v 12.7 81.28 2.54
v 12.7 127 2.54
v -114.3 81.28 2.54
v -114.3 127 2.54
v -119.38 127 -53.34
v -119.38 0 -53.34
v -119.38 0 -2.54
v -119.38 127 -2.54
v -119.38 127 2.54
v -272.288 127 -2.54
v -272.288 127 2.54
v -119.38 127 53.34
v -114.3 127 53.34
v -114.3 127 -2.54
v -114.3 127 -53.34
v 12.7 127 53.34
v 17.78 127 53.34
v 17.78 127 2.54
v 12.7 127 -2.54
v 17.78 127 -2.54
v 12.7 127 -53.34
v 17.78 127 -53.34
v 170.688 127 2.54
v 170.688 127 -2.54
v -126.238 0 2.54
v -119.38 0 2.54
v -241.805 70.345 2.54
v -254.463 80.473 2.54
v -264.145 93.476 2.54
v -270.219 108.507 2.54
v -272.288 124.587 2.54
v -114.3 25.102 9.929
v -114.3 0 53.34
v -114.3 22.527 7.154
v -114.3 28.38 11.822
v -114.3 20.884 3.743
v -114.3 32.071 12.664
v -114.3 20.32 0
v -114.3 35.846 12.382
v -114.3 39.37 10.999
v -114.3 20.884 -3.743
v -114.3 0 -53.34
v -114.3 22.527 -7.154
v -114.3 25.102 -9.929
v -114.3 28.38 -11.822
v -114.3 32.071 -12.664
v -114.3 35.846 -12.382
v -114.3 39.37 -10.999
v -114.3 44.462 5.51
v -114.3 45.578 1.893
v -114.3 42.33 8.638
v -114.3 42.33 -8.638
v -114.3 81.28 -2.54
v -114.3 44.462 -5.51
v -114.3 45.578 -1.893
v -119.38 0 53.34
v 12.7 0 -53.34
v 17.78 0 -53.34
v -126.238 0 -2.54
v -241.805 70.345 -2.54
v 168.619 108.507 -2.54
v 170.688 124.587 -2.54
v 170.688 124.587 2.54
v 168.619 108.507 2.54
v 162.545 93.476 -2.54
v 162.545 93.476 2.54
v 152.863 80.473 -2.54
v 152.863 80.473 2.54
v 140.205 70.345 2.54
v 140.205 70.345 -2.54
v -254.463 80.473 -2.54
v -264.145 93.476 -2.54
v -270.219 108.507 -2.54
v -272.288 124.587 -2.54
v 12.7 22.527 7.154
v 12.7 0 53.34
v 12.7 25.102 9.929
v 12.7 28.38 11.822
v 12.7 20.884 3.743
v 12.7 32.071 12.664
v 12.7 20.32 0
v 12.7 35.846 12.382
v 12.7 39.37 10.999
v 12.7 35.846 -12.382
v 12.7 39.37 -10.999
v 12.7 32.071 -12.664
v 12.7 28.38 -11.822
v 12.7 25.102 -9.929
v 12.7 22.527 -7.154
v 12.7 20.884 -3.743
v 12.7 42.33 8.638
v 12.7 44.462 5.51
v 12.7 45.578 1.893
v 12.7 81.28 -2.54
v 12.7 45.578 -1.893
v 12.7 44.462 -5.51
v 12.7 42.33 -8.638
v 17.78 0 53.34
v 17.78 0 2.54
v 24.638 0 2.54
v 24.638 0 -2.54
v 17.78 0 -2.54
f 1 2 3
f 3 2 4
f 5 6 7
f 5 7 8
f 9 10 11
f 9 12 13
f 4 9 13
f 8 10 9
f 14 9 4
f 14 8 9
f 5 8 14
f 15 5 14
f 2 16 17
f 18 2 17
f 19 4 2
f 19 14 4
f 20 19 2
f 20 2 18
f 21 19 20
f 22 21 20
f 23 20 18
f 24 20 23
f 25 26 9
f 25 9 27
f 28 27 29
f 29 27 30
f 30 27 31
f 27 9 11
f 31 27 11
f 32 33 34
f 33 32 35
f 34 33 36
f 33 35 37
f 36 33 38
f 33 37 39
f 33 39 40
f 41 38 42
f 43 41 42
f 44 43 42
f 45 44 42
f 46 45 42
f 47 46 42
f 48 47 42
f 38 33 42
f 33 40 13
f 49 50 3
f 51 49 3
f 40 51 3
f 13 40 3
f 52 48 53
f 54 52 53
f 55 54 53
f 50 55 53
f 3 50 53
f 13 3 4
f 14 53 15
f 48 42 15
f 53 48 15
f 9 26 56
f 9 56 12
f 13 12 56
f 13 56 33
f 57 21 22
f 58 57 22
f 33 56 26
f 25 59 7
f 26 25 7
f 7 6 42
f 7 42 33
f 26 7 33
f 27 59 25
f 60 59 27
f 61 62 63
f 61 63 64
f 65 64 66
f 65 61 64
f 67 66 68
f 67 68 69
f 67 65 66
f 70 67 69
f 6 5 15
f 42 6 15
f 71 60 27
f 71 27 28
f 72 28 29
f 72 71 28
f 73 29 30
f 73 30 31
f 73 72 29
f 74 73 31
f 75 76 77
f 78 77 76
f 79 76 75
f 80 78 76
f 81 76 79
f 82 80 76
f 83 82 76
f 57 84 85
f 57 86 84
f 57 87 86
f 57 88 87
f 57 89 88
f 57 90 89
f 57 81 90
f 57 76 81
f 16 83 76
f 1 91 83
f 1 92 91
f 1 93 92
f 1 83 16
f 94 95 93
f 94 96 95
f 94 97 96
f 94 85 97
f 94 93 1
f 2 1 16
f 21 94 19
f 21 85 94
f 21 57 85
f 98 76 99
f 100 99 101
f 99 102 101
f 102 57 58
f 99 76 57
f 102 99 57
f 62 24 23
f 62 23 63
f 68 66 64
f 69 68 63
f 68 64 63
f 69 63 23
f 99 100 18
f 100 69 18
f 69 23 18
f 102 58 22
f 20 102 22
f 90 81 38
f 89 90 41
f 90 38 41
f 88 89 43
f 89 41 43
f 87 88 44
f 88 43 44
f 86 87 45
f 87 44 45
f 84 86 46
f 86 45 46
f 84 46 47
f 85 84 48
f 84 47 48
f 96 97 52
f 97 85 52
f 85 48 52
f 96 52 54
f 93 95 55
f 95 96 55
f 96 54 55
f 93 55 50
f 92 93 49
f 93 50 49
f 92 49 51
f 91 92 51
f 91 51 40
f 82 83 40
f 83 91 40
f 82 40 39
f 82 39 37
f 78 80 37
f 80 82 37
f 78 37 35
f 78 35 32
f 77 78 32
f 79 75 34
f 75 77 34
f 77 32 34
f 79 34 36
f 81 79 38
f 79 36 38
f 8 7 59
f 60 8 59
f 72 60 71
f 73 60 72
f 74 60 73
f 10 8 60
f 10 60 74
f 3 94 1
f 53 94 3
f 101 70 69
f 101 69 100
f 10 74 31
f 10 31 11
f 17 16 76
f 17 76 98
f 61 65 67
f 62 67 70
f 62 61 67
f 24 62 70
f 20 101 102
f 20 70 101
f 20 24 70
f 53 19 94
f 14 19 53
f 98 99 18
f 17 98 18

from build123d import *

# Parameters (mm, degrees)
BOSS_EXTRUDE1_DEPTH      = 2.54
BOSS_EXTRUDE1_DEPTH_BACK = 2.54
BOSS_EXTRUDE2_DEPTH      = 50.8
BOSS_EXTRUDE2_DEPTH_BACK = 55.88
SKETCH3_W                = 5.08
SKETCH3_H                = 127
BOSS_EXTRUDE3_REACH      = 318.532
SKETCH4_R                = 12.7


with BuildPart() as part:
    # Sketch2 → Boss-Extrude1 (new, two sides: drawn at the far end of the back side and taken through both)
    with BuildSketch(Plane.XY.offset(-BOSS_EXTRUDE1_DEPTH_BACK)):
        with BuildLine():
            Line((-114.3, 0), (-126.238, 0))
            Line((-126.238, 0), (-241.804631128, 70.344905904))
            ThreePointArc((-241.804631128, 70.344905904), (-264.145050484, 93.476275329), (-272.288, 124.586514185))
            Line((-272.288, 124.586514185), (-272.288, 127))
            Line((-272.288, 127), (170.688, 127))
            Line((170.688, 127), (170.688, 124.586514185))
            ThreePointArc((170.688, 124.586514185), (162.545050484, 93.476275329), (140.204631128, 70.344905904))
            Line((140.204631128, 70.344905904), (24.638, 0))
            Line((24.638, 0), (12.7, 0))
            Line((12.7, 0), (12.7, 81.28))
            Line((12.7, 81.28), (-114.3, 81.28))
            Line((-114.3, 81.28), (-114.3, 0))
        make_face()
    extrude(amount=BOSS_EXTRUDE1_DEPTH + BOSS_EXTRUDE1_DEPTH_BACK)

    # Sketch3 → Boss-Extrude2 (add, two sides: drawn at the far end of the back side and taken through both)
    with BuildSketch(Plane.XY.offset(2.54).offset(-BOSS_EXTRUDE2_DEPTH_BACK)):
        with Locations((-116.84, 63.5)):
            Rectangle(SKETCH3_W, SKETCH3_H)
        with Locations((15.24, 63.5)):
            Rectangle(SKETCH3_W, SKETCH3_H)
    extrude(amount=BOSS_EXTRUDE2_DEPTH + BOSS_EXTRUDE2_DEPTH_BACK)

    # Sketch4 → Boss-Extrude3 (add, up to next)
    with BuildSketch(Plane(origin=(-114.3, 0, 0), x_dir=(0, 0, -1), z_dir=(1, 0, 0)), mode=Mode.PRIVATE) as boss_extrude3_sk1:
        with Locations((0, 33.02)):
            Circle(SKETCH4_R)
    boss_extrude3_tool1 = extrude(boss_extrude3_sk1.sketch, amount=BOSS_EXTRUDE3_REACH, mode=Mode.PRIVATE) - part.part
    add(boss_extrude3_tool1.solids().sort_by_distance((-114.3, 33.02, 0))[0])


solid = part.part
